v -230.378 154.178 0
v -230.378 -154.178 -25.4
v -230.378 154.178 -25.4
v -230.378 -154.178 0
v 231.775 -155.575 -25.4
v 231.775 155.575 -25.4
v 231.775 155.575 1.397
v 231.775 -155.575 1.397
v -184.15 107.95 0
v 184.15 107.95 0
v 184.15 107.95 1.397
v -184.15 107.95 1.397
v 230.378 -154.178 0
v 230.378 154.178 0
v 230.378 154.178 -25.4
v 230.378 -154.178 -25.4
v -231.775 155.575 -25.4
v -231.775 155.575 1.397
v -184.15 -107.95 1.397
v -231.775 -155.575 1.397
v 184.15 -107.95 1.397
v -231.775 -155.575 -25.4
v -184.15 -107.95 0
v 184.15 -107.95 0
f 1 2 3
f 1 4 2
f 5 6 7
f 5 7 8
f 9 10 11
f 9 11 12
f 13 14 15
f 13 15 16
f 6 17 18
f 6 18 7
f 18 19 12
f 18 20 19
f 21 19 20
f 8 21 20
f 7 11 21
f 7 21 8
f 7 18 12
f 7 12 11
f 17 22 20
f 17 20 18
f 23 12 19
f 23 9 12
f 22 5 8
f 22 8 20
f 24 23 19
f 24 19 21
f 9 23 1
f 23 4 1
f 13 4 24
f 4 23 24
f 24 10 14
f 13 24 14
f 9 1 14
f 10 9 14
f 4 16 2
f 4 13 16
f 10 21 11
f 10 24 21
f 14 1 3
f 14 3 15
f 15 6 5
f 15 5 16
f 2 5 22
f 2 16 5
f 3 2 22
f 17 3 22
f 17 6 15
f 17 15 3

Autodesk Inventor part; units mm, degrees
ref_plane "YZ Plane" through (0, 0, 0) normal (1, 0, 0) x (0, 1, 0)
ref_plane "XZ Plane" through (0, 0, 0) normal (0, 1, 0) x (-1, 0, 0)
ref_plane "XY Plane" through (0, 0, 0) normal (0, 0, 1) x (1, 0, 0)
sketch "Sketch1" plane through (0, 0, 0) normal (0, 0, 1) x (1, 0, 0)
  line L0 (-231.775, 155.575) -> (231.775, 155.575)
  line L1 (231.775, 155.575) -> (231.775, -155.575)
  line L2 (231.775, -155.575) -> (-231.775, -155.575)
  line L3 (-231.775, -155.575) -> (-231.775, 155.575)
  line L4 (-231.775, 155.575) -> (231.775, -155.575) construction
  line L5 (231.775, 155.575) -> (-231.775, -155.575) construction
  line L6 (184.15, -107.95) -> (184.15, 107.95)
  line L7 (184.15, 107.95) -> (-184.15, 107.95)
  line L8 (-184.15, 107.95) -> (-184.15, -107.95)
  line L9 (-184.15, -107.95) -> (184.15, -107.95)
  point P0 (0, 0)
  dimension "d0" = 463.55
  dimension "d1" = 311.15
  dimension "d2" = 47.625
extrude "Extrusion1" add sketch "Sketch1" along normal blind 1.397
sketch "Sketch2" plane through (0, 0, 0) normal (0, 0, -1) x (-1, 0, 0)
  line L0 (-231.775, -155.575) -> (-231.775, 155.575) projected
  line L1 (231.775, -155.575) -> (-231.775, -155.575)
  line L2 (-231.775, -155.575) -> (-231.775, 155.575)
  line L3 (-231.775, 155.575) -> (231.775, 155.575)
  line L4 (231.775, 155.575) -> (231.775, -155.575)
  line L5 (231.775, -155.575) -> (-231.775, 155.575) construction
  line L6 (-231.775, -155.575) -> (231.775, 155.575) construction
  line L7 (230.378, 154.178) -> (-230.378, 154.178)
  line L8 (-230.378, 154.178) -> (-230.378, -154.178)
  line L9 (-230.378, -154.178) -> (230.378, -154.178)
  line L10 (230.378, -154.178) -> (230.378, 154.178)
  point P0 (0, 0)
  dimension "d5" = 1.397
extrude "Extrusion2" add sketch "Sketch2" along normal blind 25.4
properties part number "Top Frame Piece" material "Steel, Mild"
